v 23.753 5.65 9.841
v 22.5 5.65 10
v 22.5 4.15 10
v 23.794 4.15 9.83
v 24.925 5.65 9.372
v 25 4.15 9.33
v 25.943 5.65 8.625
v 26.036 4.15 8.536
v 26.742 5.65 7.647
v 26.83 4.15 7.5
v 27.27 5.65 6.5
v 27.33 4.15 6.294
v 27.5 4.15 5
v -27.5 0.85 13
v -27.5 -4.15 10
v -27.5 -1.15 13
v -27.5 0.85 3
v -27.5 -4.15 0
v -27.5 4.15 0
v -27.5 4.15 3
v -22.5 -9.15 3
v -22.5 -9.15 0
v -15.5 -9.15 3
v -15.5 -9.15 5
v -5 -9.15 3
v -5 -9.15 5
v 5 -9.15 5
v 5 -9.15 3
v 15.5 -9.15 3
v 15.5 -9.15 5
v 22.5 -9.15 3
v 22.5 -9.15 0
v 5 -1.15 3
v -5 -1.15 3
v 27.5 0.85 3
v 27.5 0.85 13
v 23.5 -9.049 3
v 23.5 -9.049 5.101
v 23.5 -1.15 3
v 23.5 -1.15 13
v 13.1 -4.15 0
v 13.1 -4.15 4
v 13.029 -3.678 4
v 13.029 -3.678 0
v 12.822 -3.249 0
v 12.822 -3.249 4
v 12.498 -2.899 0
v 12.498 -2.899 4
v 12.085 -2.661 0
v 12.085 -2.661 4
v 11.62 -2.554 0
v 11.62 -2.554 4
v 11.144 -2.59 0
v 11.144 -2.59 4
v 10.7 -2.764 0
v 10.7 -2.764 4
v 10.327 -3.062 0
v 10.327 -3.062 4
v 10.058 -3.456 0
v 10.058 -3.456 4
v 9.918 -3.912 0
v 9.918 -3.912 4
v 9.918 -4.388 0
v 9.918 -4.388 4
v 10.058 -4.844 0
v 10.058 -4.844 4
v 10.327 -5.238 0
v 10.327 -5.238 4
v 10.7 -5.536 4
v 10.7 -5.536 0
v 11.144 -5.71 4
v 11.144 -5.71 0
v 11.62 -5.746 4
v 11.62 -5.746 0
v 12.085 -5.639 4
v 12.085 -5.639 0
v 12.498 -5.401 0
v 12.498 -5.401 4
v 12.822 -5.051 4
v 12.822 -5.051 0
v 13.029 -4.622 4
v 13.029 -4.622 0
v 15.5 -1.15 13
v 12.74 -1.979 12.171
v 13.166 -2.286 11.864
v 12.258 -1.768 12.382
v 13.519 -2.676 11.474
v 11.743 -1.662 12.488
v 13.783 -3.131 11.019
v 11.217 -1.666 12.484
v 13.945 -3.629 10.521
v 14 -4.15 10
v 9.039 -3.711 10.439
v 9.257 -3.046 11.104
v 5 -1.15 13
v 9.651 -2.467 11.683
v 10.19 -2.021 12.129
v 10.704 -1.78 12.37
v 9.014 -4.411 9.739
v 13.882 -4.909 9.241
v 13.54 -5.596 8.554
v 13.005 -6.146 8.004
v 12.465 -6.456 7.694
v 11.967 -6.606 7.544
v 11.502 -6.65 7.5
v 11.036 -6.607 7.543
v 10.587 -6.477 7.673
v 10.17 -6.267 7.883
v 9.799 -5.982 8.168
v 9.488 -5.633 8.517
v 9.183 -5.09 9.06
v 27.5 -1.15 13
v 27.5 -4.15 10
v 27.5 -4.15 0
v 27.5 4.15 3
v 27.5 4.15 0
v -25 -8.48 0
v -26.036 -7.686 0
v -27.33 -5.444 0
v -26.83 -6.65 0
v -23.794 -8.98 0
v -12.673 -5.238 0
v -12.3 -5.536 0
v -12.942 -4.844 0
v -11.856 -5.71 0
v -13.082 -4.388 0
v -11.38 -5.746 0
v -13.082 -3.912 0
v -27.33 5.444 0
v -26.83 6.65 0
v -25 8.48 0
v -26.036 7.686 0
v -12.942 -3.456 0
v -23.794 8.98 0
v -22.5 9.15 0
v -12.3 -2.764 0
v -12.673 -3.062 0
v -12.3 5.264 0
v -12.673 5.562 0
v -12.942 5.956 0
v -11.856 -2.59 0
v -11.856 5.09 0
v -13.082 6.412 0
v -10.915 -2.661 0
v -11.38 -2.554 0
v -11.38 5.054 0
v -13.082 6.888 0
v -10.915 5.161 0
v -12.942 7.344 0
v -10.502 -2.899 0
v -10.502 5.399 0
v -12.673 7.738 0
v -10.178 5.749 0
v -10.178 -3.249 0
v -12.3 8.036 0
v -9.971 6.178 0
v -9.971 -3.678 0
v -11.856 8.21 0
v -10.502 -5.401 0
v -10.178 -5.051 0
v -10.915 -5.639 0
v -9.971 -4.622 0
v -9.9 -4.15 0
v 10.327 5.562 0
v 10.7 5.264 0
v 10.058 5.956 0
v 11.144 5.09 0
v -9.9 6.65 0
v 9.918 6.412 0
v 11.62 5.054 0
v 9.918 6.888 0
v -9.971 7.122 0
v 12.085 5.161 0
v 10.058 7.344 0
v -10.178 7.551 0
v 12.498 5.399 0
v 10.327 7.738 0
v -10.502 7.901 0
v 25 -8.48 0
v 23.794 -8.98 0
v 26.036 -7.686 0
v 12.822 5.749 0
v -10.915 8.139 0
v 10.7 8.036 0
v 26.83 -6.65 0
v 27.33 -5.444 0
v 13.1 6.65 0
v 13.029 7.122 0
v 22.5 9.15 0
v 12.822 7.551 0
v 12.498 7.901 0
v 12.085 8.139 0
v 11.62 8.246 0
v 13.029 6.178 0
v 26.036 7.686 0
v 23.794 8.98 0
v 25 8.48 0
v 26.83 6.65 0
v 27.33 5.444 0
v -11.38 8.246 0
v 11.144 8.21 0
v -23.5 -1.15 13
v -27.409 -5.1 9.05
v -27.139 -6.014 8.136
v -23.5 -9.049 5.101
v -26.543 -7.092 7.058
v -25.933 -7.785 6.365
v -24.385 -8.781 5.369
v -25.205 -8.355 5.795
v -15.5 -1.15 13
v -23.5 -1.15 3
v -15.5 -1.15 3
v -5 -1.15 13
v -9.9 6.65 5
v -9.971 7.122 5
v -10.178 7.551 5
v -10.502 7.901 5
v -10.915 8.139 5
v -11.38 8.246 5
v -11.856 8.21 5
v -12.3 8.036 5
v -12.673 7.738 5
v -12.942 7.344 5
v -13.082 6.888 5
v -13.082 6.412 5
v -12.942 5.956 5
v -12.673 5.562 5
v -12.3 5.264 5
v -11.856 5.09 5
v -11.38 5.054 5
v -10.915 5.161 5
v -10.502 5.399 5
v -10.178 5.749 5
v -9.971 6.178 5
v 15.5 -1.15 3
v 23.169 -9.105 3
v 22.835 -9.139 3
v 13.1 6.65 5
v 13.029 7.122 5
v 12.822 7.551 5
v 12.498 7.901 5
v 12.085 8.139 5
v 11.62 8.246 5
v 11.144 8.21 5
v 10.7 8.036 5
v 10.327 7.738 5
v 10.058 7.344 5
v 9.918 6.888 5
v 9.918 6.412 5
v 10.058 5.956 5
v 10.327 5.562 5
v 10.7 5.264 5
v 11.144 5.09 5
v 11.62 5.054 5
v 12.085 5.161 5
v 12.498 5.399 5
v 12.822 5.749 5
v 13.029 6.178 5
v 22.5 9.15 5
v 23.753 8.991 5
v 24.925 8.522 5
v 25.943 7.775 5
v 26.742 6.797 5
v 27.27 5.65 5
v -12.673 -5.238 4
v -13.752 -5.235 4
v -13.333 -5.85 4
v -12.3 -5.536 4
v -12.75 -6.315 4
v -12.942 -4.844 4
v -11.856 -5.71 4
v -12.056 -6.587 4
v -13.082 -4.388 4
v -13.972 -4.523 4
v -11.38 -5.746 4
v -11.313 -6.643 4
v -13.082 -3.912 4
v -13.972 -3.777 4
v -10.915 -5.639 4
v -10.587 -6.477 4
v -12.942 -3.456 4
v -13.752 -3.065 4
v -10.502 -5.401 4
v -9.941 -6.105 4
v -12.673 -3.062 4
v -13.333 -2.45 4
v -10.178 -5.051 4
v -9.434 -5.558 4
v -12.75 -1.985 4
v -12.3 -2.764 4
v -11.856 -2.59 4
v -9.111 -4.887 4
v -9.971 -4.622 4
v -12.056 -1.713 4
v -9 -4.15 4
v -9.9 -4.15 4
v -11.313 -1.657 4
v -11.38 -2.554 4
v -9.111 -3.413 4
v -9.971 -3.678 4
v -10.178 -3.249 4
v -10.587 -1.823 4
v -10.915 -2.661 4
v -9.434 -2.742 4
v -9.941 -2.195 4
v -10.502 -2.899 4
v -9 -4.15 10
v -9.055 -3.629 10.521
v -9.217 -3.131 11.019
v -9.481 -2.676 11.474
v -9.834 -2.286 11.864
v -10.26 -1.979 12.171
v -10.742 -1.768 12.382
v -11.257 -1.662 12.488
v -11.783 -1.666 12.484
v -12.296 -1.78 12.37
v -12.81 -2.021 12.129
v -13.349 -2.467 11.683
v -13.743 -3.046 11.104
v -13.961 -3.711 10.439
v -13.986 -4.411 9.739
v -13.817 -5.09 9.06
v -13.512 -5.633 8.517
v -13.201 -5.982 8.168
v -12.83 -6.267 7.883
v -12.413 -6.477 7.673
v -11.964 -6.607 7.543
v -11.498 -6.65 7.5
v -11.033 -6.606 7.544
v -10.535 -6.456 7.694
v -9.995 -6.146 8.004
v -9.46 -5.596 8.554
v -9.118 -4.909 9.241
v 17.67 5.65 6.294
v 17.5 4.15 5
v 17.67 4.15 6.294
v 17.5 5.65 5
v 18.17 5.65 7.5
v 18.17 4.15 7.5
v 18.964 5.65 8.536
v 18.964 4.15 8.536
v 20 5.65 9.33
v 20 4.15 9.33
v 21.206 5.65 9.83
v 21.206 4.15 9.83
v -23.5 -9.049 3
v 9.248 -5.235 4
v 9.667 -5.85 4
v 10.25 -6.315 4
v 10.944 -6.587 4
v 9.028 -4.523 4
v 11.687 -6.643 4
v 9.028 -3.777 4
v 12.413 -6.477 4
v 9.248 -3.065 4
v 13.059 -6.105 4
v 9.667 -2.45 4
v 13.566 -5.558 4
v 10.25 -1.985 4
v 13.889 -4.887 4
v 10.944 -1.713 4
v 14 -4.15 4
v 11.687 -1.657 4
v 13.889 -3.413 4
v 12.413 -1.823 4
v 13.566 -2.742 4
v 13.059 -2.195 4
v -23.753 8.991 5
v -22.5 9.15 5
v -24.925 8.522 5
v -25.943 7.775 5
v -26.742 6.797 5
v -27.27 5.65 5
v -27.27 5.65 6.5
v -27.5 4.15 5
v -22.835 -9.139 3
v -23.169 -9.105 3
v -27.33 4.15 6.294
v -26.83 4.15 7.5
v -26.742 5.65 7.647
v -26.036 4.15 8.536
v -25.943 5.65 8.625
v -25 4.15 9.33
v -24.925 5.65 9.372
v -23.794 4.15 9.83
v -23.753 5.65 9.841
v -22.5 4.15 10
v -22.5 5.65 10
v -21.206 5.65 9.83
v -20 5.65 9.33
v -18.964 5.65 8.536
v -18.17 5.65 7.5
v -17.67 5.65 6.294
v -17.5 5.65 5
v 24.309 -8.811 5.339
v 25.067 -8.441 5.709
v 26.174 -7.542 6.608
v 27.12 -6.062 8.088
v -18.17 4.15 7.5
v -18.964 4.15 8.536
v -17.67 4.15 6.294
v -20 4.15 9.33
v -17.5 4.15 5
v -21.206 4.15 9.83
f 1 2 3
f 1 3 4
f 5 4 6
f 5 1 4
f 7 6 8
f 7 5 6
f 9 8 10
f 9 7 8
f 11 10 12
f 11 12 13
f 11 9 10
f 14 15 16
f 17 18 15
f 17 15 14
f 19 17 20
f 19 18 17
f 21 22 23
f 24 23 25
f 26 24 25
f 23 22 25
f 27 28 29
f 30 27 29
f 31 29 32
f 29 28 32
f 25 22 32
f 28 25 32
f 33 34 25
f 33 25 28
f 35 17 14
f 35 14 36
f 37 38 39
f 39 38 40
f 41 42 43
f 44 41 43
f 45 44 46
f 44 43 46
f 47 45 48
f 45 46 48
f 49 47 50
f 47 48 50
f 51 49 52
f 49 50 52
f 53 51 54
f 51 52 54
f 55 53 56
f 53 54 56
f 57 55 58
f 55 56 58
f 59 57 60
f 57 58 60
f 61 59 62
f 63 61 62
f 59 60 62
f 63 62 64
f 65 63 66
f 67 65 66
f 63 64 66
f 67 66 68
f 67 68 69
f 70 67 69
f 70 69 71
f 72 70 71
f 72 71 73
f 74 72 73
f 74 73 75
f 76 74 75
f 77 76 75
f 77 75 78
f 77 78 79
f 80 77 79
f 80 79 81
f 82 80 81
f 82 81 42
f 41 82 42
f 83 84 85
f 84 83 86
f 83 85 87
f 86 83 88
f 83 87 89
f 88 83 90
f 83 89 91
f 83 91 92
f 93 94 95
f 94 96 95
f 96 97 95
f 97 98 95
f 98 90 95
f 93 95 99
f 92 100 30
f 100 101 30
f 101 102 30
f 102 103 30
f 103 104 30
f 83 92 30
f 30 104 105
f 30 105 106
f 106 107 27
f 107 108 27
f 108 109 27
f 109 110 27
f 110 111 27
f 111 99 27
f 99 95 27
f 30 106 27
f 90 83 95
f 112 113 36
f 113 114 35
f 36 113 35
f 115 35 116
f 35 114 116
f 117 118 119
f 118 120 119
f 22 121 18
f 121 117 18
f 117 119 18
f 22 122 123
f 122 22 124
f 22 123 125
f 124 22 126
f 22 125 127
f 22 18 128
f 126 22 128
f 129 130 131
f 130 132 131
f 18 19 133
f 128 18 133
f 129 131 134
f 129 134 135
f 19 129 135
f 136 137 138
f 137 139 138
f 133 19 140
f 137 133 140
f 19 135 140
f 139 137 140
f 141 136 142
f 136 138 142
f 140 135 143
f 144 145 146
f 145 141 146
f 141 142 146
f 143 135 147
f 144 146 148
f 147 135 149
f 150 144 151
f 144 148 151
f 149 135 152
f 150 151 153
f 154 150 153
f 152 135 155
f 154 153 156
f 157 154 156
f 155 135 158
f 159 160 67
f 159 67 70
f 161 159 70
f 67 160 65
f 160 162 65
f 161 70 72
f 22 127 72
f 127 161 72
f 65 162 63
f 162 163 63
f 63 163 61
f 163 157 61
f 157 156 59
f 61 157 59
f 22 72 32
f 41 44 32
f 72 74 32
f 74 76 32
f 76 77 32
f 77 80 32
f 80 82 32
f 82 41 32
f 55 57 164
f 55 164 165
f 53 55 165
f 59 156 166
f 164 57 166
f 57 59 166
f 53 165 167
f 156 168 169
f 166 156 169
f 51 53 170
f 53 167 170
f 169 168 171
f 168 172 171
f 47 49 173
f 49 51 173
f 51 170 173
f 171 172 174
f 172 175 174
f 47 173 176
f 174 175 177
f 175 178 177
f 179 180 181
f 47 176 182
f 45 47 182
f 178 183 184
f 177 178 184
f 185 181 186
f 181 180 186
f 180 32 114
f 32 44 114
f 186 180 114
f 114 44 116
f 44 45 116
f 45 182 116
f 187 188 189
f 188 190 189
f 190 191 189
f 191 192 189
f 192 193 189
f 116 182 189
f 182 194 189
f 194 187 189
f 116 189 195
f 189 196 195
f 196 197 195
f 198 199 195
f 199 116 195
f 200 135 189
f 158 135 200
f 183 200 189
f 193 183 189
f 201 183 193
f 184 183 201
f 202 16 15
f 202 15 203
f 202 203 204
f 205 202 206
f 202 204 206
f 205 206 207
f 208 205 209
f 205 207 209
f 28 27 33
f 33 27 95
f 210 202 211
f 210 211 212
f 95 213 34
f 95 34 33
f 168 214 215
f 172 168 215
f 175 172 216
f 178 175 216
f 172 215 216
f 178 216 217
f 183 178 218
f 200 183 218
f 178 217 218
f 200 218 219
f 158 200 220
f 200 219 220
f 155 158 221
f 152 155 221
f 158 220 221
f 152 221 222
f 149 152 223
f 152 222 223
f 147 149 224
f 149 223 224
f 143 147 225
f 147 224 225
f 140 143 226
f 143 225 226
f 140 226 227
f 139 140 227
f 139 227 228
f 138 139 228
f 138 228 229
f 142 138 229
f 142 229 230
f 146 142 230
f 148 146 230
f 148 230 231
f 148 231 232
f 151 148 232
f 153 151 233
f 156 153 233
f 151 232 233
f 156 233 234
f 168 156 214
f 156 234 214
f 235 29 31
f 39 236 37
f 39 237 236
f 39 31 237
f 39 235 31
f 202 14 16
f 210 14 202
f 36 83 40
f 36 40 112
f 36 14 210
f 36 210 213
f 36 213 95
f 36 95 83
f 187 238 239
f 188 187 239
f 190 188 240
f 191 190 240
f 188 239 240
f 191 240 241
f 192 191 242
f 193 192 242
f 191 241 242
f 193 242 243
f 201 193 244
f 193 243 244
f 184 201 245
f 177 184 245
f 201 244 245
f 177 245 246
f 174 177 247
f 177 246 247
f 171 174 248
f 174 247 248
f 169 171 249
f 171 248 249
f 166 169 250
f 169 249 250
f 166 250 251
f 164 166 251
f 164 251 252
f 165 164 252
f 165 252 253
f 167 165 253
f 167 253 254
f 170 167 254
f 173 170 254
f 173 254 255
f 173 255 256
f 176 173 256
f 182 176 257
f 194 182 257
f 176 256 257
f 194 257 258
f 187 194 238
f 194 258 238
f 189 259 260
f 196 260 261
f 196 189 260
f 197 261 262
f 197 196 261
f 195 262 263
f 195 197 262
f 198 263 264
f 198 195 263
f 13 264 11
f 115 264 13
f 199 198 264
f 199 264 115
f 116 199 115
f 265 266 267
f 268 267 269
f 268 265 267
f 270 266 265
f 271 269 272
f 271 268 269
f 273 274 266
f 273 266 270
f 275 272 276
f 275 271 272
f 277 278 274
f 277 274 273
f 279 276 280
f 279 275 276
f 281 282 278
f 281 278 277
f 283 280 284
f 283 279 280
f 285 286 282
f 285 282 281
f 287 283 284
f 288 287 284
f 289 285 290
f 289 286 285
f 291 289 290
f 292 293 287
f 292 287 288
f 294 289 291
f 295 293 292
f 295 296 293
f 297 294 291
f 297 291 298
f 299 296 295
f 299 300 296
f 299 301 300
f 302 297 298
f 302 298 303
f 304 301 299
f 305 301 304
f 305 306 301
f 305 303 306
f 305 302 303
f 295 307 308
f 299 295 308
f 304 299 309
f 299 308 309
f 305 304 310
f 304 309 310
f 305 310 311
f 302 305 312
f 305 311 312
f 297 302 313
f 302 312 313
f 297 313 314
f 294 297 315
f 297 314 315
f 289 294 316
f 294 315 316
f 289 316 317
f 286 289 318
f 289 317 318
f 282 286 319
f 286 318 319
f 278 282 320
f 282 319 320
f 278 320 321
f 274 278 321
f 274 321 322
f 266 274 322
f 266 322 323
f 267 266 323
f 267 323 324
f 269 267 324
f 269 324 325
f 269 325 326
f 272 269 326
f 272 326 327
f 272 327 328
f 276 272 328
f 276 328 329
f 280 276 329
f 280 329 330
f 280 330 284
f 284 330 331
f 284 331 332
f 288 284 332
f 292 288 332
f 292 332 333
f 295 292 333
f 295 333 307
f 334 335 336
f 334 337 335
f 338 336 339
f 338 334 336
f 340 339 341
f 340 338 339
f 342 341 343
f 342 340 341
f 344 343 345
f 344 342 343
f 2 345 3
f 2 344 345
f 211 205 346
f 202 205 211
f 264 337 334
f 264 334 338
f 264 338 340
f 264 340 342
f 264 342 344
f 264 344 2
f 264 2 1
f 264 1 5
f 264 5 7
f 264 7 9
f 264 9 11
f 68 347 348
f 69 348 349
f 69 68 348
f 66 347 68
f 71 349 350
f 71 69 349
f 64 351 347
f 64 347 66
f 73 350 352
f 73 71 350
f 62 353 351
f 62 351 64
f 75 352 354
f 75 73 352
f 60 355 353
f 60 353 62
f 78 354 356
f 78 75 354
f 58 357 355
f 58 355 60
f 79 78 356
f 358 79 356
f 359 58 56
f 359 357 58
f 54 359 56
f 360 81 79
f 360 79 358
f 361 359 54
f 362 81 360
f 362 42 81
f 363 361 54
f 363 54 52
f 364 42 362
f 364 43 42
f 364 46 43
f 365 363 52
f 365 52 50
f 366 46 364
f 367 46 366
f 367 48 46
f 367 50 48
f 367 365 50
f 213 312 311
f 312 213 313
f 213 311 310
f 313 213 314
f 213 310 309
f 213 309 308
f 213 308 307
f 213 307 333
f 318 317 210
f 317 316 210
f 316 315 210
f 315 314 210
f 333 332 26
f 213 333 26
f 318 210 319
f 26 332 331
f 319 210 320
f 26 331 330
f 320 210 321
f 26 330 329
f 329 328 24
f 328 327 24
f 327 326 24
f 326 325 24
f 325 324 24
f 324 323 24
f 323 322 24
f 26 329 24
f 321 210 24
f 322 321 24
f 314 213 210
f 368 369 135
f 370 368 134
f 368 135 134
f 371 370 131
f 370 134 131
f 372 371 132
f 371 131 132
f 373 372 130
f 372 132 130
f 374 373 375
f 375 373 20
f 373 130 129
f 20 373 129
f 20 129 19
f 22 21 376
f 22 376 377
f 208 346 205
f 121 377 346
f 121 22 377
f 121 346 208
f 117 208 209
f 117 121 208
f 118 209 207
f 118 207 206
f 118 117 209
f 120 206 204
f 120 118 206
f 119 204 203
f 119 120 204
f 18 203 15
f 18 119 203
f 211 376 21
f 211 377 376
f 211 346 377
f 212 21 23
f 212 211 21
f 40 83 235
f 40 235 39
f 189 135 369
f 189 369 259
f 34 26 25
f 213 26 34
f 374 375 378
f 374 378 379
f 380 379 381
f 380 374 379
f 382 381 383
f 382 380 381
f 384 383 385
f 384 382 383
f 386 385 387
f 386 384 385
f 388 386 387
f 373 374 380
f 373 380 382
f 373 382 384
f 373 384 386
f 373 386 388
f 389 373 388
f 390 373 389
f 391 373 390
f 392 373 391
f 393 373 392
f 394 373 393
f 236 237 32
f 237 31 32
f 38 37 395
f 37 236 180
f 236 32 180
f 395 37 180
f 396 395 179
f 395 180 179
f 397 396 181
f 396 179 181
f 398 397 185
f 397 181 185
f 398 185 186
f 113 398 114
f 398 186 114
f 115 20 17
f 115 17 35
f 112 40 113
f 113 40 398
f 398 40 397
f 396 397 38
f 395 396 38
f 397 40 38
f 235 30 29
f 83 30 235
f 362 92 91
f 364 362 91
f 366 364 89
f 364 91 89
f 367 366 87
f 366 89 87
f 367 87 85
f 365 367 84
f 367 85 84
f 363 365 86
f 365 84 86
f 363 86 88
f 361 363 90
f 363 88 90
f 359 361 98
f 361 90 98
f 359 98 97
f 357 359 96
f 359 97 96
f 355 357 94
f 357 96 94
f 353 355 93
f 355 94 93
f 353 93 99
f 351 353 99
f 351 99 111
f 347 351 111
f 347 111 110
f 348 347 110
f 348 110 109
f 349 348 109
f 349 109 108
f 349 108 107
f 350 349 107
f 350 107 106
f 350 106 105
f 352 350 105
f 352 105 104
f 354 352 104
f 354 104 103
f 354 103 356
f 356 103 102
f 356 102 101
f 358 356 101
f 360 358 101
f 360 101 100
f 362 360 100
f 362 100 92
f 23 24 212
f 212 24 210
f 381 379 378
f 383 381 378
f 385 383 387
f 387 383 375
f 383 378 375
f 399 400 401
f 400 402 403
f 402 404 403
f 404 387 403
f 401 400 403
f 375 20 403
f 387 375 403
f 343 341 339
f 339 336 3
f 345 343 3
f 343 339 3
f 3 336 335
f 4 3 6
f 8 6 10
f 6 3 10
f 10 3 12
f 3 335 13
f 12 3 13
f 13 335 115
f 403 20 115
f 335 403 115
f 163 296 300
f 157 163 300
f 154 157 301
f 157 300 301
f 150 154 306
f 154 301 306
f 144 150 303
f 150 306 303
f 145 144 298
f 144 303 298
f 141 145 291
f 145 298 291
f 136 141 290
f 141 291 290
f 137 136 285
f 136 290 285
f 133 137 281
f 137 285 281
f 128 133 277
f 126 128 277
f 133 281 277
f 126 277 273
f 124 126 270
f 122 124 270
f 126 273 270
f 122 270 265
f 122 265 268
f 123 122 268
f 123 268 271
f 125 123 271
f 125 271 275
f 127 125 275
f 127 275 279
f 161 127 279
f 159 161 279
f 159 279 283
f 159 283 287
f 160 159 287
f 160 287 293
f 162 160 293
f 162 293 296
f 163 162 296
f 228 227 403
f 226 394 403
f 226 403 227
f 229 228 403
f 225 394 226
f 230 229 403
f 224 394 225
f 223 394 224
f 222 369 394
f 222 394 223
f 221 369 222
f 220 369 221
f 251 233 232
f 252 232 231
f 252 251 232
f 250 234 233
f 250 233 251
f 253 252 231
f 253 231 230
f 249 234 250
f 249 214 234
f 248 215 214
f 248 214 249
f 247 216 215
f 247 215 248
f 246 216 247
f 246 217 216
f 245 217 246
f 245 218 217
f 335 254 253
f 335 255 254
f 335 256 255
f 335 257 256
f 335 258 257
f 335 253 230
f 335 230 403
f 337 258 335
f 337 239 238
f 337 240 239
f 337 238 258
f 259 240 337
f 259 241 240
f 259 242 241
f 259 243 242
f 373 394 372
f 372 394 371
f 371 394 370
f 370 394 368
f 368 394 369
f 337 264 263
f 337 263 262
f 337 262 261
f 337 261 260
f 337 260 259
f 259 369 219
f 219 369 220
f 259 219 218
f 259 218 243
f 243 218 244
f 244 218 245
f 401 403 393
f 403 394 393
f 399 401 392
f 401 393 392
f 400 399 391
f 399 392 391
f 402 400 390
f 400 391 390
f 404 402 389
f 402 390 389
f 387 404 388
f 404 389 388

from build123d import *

# Parameters (mm, degrees)
F0_W         = 55
F0_H         = 18.3
F1_DEPTH     = 3
F2_W         = 55
F2_H         = 5
F3_DEPTH     = 2
F4_W         = 55
F4_H         = 10
F5_DEPTH     = 1
F6_W         = 10
F6_H         = 1.5
F7_DEPTH     = 5
F8_R         = 4.99999
F9_DEPTH     = 9
F11_R        = 1.6
F12_DEPTH    = 5
F13_R        = 1.6
F14_DEPTH    = 13
F15_W        = 10
F15_H        = 8
F15_W_2      = 8
F16_DEPTH    = 10
F17_R        = 2.5
F18_DEPTH    = 9
F19_T1_DEPTH = 45.1469278075
F19_T3_DEPTH = 51.6469278075
F19_T5_DEPTH = 51.6469278075
F19_T7_DEPTH = 45.1469278075
F20_T1_DEPTH = 30


# Not quite as in the source:
# - a fillet or chamfer that OpenCascade refuses, or shapes differently, is made with other operations: its cross-section is extruded or revolved along the edge and cut away or added
# - a fillet or chamfer is up to 0.001 mm smaller than in the source, because OpenCascade refuses the exact size


with BuildPart() as f1:
    # F0 (on Top) → F1 (new body)
    with BuildSketch(Plane.XY):
        Rectangle(F0_W, F0_H)
    extrude(amount=F1_DEPTH)

    # F2 (on face) → F3 (join)
    with BuildSketch(Plane.XY.offset(3)):
        with Locations((0, 6.65)):
            Rectangle(F2_W, F2_H)
    extrude(amount=F3_DEPTH)

    # F4 (on face) → F5 (join)
    with BuildSketch(Plane.XY.offset(3)):
        with Locations((0, -4.15)):
            Rectangle(F4_W, F4_H)
    extrude(amount=F5_DEPTH)

    # F6 (on face) → F7 (join)
    with BuildSketch(Plane.XY.offset(5)):
        with Locations((22.5, 4.9)):
            Rectangle(F6_W, F6_H)
        with Locations((-22.5, 4.9)):
            Rectangle(F6_W, F6_H)
    extrude(amount=F7_DEPTH)

    # F8 (radius 5 in the source; OpenCascade refuses exactly that, so slightly less here)
    f8_edges = [f1.edges().sort_by_distance(p)[0] for p in [
        (17.5, 4.9, 10),
        (27.5, 4.9, 10),
        (-27.5, 4.9, 10),
        (-17.5, 4.9, 10),
    ]]
    fillet(f8_edges, radius=F8_R)

    # F9 (add): a face of the model
    f9_faces = [f1.faces().sort_by_distance(p)[0] for p in [
        (0, -4.15, 4),
    ]]
    extrude(f9_faces, amount=F9_DEPTH)

    # F11 (on face) → F12 (cut)
    with BuildSketch(Plane.XY.offset(5)):
        with Locations((11.5, 6.65)):
            Circle(F11_R)
        with Locations((-11.5, 6.65)):
            Circle(F11_R)
    extrude(amount=-F12_DEPTH, mode=Mode.SUBTRACT)

    # F13 (on face) → F14 (cut)
    with BuildSketch(Plane.XY.offset(13)):
        with Locations((11.5, -4.15)):
            Circle(F13_R)
        with Locations((-11.5, -4.15)):
            Circle(F13_R)
    extrude(amount=-F14_DEPTH, mode=Mode.SUBTRACT)

    # F15 (on face) → F16 (cut)
    with BuildSketch(Plane.XY.offset(13)):
        with Locations((0, -5.15)):
            Rectangle(F15_W, F15_H)
        with Locations((19.5, -5.15)):
            Rectangle(F15_W_2, F15_H)
        with Locations((-19.5, -5.15)):
            Rectangle(F15_W_2, F15_H)
    extrude(amount=-F16_DEPTH, mode=Mode.SUBTRACT)

    # F17 (on face) → F18 (cut)
    with BuildSketch(Plane.XY.offset(13)):
        with Locations((11.5, -4.15)):
            Circle(F17_R)
        with Locations((-11.5, -4.15)):
            Circle(F17_R)
    extrude(amount=-F18_DEPTH, mode=Mode.SUBTRACT)

    # F19: chamfer of 8 on 4 edges, made by hand

    # F19_s2 → F19_t1 (cut)
    with BuildSketch(Plane.YZ.offset(2.9265360963)):
        Polygon((-1.15, 13), (-9.15, 5), (-9.15, 13), align=None)
    extrude(amount=F19_T1_DEPTH, mode=Mode.SUBTRACT)

    # F19_s4 → F19_t3 (cut)
    with BuildSketch(Plane.YZ.offset(-15.5734639037)):
        Polygon((-1.15, 13), (-9.15, 5), (-9.15, 13), align=None)
    extrude(amount=F19_T3_DEPTH, mode=Mode.SUBTRACT)

    # F19_s6 → F19_t5 (cut)
    with BuildSketch(Plane.YZ.offset(-36.0734639037)):
        Polygon((-1.15, 13), (-9.15, 5), (-9.15, 13), align=None)
    extrude(amount=F19_T5_DEPTH, mode=Mode.SUBTRACT)

    # F19_s8 → F19_t7 (cut)
    with BuildSketch(Plane.YZ.offset(-48.0734639037)):
        Polygon((-1.15, 13), (-9.15, 5), (-9.15, 13), align=None)
    extrude(amount=F19_T7_DEPTH, mode=Mode.SUBTRACT)

    # F20: fillet of radius 5 on 4 edges, made by hand

    # F20_s2 → F20_t1 (cut)
    with BuildSketch(Plane.XY.offset(-12.5)):
        with BuildLine():
            ThreePointArc((22.5, -9.15), (26.0355339059, -7.6855339059), (27.5, -4.15))
            Line((27.5, -4.15), (27.5, -9.15))
            Line((27.5, -9.15), (22.5, -9.15))
        make_face()
        with BuildLine():
            ThreePointArc((22.5, 9.15), (26.0355339059, 7.6855339059), (27.5, 4.15))
            Line((27.5, 4.15), (27.5, 9.15))
            Line((27.5, 9.15), (22.5, 9.15))
        make_face()
        with BuildLine():
            ThreePointArc((-22.5, 9.15), (-26.0355339059, 7.6855339059), (-27.5, 4.15))
            Line((-27.5, 4.15), (-27.5, 9.15))
            Line((-27.5, 9.15), (-22.5, 9.15))
        make_face()
        with BuildLine():
            ThreePointArc((-22.5, -9.15), (-26.0355339059, -7.6855339059), (-27.5, -4.15))
            Line((-27.5, -4.15), (-27.5, -9.15))
            Line((-27.5, -9.15), (-22.5, -9.15))
        make_face()
    extrude(amount=F20_T1_DEPTH, mode=Mode.SUBTRACT)


solid = f1.part
